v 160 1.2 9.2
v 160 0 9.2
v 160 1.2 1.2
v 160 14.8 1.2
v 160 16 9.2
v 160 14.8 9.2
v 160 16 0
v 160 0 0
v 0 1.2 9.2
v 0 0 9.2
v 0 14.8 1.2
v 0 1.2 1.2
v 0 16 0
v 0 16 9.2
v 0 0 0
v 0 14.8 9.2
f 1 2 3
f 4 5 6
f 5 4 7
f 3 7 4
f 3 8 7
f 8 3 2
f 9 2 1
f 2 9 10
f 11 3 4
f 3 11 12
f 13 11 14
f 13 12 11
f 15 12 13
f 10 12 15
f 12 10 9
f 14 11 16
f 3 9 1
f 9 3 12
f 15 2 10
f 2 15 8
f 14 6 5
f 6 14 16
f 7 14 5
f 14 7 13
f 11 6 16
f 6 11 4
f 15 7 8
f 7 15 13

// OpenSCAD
// ScienceClaw nominal U-channel. All dimensions in millimeters.
// Clamp the first clamp_length along x. No holes or clamp reinforcement.
// Print parameters, layer orientation, material batch, and actual dimensions
// must be recorded separately; this file does not prescribe a qualified process.
length = 160;
clamp_length = 25;
base_width = 16;
wall_height = 8;
thickness = 1.2;
assert(length > clamp_length && clamp_length > 0);
assert(base_width > 2 * thickness && thickness > 0 && wall_height >= 0);
union() {
    cube([length, base_width, thickness]);
    if (wall_height > 0) {
        translate([0, 0, thickness]) cube([length, thickness, wall_height]);
        translate([0, base_width - thickness, thickness]) cube([length, thickness, wall_height]);
    }
}
